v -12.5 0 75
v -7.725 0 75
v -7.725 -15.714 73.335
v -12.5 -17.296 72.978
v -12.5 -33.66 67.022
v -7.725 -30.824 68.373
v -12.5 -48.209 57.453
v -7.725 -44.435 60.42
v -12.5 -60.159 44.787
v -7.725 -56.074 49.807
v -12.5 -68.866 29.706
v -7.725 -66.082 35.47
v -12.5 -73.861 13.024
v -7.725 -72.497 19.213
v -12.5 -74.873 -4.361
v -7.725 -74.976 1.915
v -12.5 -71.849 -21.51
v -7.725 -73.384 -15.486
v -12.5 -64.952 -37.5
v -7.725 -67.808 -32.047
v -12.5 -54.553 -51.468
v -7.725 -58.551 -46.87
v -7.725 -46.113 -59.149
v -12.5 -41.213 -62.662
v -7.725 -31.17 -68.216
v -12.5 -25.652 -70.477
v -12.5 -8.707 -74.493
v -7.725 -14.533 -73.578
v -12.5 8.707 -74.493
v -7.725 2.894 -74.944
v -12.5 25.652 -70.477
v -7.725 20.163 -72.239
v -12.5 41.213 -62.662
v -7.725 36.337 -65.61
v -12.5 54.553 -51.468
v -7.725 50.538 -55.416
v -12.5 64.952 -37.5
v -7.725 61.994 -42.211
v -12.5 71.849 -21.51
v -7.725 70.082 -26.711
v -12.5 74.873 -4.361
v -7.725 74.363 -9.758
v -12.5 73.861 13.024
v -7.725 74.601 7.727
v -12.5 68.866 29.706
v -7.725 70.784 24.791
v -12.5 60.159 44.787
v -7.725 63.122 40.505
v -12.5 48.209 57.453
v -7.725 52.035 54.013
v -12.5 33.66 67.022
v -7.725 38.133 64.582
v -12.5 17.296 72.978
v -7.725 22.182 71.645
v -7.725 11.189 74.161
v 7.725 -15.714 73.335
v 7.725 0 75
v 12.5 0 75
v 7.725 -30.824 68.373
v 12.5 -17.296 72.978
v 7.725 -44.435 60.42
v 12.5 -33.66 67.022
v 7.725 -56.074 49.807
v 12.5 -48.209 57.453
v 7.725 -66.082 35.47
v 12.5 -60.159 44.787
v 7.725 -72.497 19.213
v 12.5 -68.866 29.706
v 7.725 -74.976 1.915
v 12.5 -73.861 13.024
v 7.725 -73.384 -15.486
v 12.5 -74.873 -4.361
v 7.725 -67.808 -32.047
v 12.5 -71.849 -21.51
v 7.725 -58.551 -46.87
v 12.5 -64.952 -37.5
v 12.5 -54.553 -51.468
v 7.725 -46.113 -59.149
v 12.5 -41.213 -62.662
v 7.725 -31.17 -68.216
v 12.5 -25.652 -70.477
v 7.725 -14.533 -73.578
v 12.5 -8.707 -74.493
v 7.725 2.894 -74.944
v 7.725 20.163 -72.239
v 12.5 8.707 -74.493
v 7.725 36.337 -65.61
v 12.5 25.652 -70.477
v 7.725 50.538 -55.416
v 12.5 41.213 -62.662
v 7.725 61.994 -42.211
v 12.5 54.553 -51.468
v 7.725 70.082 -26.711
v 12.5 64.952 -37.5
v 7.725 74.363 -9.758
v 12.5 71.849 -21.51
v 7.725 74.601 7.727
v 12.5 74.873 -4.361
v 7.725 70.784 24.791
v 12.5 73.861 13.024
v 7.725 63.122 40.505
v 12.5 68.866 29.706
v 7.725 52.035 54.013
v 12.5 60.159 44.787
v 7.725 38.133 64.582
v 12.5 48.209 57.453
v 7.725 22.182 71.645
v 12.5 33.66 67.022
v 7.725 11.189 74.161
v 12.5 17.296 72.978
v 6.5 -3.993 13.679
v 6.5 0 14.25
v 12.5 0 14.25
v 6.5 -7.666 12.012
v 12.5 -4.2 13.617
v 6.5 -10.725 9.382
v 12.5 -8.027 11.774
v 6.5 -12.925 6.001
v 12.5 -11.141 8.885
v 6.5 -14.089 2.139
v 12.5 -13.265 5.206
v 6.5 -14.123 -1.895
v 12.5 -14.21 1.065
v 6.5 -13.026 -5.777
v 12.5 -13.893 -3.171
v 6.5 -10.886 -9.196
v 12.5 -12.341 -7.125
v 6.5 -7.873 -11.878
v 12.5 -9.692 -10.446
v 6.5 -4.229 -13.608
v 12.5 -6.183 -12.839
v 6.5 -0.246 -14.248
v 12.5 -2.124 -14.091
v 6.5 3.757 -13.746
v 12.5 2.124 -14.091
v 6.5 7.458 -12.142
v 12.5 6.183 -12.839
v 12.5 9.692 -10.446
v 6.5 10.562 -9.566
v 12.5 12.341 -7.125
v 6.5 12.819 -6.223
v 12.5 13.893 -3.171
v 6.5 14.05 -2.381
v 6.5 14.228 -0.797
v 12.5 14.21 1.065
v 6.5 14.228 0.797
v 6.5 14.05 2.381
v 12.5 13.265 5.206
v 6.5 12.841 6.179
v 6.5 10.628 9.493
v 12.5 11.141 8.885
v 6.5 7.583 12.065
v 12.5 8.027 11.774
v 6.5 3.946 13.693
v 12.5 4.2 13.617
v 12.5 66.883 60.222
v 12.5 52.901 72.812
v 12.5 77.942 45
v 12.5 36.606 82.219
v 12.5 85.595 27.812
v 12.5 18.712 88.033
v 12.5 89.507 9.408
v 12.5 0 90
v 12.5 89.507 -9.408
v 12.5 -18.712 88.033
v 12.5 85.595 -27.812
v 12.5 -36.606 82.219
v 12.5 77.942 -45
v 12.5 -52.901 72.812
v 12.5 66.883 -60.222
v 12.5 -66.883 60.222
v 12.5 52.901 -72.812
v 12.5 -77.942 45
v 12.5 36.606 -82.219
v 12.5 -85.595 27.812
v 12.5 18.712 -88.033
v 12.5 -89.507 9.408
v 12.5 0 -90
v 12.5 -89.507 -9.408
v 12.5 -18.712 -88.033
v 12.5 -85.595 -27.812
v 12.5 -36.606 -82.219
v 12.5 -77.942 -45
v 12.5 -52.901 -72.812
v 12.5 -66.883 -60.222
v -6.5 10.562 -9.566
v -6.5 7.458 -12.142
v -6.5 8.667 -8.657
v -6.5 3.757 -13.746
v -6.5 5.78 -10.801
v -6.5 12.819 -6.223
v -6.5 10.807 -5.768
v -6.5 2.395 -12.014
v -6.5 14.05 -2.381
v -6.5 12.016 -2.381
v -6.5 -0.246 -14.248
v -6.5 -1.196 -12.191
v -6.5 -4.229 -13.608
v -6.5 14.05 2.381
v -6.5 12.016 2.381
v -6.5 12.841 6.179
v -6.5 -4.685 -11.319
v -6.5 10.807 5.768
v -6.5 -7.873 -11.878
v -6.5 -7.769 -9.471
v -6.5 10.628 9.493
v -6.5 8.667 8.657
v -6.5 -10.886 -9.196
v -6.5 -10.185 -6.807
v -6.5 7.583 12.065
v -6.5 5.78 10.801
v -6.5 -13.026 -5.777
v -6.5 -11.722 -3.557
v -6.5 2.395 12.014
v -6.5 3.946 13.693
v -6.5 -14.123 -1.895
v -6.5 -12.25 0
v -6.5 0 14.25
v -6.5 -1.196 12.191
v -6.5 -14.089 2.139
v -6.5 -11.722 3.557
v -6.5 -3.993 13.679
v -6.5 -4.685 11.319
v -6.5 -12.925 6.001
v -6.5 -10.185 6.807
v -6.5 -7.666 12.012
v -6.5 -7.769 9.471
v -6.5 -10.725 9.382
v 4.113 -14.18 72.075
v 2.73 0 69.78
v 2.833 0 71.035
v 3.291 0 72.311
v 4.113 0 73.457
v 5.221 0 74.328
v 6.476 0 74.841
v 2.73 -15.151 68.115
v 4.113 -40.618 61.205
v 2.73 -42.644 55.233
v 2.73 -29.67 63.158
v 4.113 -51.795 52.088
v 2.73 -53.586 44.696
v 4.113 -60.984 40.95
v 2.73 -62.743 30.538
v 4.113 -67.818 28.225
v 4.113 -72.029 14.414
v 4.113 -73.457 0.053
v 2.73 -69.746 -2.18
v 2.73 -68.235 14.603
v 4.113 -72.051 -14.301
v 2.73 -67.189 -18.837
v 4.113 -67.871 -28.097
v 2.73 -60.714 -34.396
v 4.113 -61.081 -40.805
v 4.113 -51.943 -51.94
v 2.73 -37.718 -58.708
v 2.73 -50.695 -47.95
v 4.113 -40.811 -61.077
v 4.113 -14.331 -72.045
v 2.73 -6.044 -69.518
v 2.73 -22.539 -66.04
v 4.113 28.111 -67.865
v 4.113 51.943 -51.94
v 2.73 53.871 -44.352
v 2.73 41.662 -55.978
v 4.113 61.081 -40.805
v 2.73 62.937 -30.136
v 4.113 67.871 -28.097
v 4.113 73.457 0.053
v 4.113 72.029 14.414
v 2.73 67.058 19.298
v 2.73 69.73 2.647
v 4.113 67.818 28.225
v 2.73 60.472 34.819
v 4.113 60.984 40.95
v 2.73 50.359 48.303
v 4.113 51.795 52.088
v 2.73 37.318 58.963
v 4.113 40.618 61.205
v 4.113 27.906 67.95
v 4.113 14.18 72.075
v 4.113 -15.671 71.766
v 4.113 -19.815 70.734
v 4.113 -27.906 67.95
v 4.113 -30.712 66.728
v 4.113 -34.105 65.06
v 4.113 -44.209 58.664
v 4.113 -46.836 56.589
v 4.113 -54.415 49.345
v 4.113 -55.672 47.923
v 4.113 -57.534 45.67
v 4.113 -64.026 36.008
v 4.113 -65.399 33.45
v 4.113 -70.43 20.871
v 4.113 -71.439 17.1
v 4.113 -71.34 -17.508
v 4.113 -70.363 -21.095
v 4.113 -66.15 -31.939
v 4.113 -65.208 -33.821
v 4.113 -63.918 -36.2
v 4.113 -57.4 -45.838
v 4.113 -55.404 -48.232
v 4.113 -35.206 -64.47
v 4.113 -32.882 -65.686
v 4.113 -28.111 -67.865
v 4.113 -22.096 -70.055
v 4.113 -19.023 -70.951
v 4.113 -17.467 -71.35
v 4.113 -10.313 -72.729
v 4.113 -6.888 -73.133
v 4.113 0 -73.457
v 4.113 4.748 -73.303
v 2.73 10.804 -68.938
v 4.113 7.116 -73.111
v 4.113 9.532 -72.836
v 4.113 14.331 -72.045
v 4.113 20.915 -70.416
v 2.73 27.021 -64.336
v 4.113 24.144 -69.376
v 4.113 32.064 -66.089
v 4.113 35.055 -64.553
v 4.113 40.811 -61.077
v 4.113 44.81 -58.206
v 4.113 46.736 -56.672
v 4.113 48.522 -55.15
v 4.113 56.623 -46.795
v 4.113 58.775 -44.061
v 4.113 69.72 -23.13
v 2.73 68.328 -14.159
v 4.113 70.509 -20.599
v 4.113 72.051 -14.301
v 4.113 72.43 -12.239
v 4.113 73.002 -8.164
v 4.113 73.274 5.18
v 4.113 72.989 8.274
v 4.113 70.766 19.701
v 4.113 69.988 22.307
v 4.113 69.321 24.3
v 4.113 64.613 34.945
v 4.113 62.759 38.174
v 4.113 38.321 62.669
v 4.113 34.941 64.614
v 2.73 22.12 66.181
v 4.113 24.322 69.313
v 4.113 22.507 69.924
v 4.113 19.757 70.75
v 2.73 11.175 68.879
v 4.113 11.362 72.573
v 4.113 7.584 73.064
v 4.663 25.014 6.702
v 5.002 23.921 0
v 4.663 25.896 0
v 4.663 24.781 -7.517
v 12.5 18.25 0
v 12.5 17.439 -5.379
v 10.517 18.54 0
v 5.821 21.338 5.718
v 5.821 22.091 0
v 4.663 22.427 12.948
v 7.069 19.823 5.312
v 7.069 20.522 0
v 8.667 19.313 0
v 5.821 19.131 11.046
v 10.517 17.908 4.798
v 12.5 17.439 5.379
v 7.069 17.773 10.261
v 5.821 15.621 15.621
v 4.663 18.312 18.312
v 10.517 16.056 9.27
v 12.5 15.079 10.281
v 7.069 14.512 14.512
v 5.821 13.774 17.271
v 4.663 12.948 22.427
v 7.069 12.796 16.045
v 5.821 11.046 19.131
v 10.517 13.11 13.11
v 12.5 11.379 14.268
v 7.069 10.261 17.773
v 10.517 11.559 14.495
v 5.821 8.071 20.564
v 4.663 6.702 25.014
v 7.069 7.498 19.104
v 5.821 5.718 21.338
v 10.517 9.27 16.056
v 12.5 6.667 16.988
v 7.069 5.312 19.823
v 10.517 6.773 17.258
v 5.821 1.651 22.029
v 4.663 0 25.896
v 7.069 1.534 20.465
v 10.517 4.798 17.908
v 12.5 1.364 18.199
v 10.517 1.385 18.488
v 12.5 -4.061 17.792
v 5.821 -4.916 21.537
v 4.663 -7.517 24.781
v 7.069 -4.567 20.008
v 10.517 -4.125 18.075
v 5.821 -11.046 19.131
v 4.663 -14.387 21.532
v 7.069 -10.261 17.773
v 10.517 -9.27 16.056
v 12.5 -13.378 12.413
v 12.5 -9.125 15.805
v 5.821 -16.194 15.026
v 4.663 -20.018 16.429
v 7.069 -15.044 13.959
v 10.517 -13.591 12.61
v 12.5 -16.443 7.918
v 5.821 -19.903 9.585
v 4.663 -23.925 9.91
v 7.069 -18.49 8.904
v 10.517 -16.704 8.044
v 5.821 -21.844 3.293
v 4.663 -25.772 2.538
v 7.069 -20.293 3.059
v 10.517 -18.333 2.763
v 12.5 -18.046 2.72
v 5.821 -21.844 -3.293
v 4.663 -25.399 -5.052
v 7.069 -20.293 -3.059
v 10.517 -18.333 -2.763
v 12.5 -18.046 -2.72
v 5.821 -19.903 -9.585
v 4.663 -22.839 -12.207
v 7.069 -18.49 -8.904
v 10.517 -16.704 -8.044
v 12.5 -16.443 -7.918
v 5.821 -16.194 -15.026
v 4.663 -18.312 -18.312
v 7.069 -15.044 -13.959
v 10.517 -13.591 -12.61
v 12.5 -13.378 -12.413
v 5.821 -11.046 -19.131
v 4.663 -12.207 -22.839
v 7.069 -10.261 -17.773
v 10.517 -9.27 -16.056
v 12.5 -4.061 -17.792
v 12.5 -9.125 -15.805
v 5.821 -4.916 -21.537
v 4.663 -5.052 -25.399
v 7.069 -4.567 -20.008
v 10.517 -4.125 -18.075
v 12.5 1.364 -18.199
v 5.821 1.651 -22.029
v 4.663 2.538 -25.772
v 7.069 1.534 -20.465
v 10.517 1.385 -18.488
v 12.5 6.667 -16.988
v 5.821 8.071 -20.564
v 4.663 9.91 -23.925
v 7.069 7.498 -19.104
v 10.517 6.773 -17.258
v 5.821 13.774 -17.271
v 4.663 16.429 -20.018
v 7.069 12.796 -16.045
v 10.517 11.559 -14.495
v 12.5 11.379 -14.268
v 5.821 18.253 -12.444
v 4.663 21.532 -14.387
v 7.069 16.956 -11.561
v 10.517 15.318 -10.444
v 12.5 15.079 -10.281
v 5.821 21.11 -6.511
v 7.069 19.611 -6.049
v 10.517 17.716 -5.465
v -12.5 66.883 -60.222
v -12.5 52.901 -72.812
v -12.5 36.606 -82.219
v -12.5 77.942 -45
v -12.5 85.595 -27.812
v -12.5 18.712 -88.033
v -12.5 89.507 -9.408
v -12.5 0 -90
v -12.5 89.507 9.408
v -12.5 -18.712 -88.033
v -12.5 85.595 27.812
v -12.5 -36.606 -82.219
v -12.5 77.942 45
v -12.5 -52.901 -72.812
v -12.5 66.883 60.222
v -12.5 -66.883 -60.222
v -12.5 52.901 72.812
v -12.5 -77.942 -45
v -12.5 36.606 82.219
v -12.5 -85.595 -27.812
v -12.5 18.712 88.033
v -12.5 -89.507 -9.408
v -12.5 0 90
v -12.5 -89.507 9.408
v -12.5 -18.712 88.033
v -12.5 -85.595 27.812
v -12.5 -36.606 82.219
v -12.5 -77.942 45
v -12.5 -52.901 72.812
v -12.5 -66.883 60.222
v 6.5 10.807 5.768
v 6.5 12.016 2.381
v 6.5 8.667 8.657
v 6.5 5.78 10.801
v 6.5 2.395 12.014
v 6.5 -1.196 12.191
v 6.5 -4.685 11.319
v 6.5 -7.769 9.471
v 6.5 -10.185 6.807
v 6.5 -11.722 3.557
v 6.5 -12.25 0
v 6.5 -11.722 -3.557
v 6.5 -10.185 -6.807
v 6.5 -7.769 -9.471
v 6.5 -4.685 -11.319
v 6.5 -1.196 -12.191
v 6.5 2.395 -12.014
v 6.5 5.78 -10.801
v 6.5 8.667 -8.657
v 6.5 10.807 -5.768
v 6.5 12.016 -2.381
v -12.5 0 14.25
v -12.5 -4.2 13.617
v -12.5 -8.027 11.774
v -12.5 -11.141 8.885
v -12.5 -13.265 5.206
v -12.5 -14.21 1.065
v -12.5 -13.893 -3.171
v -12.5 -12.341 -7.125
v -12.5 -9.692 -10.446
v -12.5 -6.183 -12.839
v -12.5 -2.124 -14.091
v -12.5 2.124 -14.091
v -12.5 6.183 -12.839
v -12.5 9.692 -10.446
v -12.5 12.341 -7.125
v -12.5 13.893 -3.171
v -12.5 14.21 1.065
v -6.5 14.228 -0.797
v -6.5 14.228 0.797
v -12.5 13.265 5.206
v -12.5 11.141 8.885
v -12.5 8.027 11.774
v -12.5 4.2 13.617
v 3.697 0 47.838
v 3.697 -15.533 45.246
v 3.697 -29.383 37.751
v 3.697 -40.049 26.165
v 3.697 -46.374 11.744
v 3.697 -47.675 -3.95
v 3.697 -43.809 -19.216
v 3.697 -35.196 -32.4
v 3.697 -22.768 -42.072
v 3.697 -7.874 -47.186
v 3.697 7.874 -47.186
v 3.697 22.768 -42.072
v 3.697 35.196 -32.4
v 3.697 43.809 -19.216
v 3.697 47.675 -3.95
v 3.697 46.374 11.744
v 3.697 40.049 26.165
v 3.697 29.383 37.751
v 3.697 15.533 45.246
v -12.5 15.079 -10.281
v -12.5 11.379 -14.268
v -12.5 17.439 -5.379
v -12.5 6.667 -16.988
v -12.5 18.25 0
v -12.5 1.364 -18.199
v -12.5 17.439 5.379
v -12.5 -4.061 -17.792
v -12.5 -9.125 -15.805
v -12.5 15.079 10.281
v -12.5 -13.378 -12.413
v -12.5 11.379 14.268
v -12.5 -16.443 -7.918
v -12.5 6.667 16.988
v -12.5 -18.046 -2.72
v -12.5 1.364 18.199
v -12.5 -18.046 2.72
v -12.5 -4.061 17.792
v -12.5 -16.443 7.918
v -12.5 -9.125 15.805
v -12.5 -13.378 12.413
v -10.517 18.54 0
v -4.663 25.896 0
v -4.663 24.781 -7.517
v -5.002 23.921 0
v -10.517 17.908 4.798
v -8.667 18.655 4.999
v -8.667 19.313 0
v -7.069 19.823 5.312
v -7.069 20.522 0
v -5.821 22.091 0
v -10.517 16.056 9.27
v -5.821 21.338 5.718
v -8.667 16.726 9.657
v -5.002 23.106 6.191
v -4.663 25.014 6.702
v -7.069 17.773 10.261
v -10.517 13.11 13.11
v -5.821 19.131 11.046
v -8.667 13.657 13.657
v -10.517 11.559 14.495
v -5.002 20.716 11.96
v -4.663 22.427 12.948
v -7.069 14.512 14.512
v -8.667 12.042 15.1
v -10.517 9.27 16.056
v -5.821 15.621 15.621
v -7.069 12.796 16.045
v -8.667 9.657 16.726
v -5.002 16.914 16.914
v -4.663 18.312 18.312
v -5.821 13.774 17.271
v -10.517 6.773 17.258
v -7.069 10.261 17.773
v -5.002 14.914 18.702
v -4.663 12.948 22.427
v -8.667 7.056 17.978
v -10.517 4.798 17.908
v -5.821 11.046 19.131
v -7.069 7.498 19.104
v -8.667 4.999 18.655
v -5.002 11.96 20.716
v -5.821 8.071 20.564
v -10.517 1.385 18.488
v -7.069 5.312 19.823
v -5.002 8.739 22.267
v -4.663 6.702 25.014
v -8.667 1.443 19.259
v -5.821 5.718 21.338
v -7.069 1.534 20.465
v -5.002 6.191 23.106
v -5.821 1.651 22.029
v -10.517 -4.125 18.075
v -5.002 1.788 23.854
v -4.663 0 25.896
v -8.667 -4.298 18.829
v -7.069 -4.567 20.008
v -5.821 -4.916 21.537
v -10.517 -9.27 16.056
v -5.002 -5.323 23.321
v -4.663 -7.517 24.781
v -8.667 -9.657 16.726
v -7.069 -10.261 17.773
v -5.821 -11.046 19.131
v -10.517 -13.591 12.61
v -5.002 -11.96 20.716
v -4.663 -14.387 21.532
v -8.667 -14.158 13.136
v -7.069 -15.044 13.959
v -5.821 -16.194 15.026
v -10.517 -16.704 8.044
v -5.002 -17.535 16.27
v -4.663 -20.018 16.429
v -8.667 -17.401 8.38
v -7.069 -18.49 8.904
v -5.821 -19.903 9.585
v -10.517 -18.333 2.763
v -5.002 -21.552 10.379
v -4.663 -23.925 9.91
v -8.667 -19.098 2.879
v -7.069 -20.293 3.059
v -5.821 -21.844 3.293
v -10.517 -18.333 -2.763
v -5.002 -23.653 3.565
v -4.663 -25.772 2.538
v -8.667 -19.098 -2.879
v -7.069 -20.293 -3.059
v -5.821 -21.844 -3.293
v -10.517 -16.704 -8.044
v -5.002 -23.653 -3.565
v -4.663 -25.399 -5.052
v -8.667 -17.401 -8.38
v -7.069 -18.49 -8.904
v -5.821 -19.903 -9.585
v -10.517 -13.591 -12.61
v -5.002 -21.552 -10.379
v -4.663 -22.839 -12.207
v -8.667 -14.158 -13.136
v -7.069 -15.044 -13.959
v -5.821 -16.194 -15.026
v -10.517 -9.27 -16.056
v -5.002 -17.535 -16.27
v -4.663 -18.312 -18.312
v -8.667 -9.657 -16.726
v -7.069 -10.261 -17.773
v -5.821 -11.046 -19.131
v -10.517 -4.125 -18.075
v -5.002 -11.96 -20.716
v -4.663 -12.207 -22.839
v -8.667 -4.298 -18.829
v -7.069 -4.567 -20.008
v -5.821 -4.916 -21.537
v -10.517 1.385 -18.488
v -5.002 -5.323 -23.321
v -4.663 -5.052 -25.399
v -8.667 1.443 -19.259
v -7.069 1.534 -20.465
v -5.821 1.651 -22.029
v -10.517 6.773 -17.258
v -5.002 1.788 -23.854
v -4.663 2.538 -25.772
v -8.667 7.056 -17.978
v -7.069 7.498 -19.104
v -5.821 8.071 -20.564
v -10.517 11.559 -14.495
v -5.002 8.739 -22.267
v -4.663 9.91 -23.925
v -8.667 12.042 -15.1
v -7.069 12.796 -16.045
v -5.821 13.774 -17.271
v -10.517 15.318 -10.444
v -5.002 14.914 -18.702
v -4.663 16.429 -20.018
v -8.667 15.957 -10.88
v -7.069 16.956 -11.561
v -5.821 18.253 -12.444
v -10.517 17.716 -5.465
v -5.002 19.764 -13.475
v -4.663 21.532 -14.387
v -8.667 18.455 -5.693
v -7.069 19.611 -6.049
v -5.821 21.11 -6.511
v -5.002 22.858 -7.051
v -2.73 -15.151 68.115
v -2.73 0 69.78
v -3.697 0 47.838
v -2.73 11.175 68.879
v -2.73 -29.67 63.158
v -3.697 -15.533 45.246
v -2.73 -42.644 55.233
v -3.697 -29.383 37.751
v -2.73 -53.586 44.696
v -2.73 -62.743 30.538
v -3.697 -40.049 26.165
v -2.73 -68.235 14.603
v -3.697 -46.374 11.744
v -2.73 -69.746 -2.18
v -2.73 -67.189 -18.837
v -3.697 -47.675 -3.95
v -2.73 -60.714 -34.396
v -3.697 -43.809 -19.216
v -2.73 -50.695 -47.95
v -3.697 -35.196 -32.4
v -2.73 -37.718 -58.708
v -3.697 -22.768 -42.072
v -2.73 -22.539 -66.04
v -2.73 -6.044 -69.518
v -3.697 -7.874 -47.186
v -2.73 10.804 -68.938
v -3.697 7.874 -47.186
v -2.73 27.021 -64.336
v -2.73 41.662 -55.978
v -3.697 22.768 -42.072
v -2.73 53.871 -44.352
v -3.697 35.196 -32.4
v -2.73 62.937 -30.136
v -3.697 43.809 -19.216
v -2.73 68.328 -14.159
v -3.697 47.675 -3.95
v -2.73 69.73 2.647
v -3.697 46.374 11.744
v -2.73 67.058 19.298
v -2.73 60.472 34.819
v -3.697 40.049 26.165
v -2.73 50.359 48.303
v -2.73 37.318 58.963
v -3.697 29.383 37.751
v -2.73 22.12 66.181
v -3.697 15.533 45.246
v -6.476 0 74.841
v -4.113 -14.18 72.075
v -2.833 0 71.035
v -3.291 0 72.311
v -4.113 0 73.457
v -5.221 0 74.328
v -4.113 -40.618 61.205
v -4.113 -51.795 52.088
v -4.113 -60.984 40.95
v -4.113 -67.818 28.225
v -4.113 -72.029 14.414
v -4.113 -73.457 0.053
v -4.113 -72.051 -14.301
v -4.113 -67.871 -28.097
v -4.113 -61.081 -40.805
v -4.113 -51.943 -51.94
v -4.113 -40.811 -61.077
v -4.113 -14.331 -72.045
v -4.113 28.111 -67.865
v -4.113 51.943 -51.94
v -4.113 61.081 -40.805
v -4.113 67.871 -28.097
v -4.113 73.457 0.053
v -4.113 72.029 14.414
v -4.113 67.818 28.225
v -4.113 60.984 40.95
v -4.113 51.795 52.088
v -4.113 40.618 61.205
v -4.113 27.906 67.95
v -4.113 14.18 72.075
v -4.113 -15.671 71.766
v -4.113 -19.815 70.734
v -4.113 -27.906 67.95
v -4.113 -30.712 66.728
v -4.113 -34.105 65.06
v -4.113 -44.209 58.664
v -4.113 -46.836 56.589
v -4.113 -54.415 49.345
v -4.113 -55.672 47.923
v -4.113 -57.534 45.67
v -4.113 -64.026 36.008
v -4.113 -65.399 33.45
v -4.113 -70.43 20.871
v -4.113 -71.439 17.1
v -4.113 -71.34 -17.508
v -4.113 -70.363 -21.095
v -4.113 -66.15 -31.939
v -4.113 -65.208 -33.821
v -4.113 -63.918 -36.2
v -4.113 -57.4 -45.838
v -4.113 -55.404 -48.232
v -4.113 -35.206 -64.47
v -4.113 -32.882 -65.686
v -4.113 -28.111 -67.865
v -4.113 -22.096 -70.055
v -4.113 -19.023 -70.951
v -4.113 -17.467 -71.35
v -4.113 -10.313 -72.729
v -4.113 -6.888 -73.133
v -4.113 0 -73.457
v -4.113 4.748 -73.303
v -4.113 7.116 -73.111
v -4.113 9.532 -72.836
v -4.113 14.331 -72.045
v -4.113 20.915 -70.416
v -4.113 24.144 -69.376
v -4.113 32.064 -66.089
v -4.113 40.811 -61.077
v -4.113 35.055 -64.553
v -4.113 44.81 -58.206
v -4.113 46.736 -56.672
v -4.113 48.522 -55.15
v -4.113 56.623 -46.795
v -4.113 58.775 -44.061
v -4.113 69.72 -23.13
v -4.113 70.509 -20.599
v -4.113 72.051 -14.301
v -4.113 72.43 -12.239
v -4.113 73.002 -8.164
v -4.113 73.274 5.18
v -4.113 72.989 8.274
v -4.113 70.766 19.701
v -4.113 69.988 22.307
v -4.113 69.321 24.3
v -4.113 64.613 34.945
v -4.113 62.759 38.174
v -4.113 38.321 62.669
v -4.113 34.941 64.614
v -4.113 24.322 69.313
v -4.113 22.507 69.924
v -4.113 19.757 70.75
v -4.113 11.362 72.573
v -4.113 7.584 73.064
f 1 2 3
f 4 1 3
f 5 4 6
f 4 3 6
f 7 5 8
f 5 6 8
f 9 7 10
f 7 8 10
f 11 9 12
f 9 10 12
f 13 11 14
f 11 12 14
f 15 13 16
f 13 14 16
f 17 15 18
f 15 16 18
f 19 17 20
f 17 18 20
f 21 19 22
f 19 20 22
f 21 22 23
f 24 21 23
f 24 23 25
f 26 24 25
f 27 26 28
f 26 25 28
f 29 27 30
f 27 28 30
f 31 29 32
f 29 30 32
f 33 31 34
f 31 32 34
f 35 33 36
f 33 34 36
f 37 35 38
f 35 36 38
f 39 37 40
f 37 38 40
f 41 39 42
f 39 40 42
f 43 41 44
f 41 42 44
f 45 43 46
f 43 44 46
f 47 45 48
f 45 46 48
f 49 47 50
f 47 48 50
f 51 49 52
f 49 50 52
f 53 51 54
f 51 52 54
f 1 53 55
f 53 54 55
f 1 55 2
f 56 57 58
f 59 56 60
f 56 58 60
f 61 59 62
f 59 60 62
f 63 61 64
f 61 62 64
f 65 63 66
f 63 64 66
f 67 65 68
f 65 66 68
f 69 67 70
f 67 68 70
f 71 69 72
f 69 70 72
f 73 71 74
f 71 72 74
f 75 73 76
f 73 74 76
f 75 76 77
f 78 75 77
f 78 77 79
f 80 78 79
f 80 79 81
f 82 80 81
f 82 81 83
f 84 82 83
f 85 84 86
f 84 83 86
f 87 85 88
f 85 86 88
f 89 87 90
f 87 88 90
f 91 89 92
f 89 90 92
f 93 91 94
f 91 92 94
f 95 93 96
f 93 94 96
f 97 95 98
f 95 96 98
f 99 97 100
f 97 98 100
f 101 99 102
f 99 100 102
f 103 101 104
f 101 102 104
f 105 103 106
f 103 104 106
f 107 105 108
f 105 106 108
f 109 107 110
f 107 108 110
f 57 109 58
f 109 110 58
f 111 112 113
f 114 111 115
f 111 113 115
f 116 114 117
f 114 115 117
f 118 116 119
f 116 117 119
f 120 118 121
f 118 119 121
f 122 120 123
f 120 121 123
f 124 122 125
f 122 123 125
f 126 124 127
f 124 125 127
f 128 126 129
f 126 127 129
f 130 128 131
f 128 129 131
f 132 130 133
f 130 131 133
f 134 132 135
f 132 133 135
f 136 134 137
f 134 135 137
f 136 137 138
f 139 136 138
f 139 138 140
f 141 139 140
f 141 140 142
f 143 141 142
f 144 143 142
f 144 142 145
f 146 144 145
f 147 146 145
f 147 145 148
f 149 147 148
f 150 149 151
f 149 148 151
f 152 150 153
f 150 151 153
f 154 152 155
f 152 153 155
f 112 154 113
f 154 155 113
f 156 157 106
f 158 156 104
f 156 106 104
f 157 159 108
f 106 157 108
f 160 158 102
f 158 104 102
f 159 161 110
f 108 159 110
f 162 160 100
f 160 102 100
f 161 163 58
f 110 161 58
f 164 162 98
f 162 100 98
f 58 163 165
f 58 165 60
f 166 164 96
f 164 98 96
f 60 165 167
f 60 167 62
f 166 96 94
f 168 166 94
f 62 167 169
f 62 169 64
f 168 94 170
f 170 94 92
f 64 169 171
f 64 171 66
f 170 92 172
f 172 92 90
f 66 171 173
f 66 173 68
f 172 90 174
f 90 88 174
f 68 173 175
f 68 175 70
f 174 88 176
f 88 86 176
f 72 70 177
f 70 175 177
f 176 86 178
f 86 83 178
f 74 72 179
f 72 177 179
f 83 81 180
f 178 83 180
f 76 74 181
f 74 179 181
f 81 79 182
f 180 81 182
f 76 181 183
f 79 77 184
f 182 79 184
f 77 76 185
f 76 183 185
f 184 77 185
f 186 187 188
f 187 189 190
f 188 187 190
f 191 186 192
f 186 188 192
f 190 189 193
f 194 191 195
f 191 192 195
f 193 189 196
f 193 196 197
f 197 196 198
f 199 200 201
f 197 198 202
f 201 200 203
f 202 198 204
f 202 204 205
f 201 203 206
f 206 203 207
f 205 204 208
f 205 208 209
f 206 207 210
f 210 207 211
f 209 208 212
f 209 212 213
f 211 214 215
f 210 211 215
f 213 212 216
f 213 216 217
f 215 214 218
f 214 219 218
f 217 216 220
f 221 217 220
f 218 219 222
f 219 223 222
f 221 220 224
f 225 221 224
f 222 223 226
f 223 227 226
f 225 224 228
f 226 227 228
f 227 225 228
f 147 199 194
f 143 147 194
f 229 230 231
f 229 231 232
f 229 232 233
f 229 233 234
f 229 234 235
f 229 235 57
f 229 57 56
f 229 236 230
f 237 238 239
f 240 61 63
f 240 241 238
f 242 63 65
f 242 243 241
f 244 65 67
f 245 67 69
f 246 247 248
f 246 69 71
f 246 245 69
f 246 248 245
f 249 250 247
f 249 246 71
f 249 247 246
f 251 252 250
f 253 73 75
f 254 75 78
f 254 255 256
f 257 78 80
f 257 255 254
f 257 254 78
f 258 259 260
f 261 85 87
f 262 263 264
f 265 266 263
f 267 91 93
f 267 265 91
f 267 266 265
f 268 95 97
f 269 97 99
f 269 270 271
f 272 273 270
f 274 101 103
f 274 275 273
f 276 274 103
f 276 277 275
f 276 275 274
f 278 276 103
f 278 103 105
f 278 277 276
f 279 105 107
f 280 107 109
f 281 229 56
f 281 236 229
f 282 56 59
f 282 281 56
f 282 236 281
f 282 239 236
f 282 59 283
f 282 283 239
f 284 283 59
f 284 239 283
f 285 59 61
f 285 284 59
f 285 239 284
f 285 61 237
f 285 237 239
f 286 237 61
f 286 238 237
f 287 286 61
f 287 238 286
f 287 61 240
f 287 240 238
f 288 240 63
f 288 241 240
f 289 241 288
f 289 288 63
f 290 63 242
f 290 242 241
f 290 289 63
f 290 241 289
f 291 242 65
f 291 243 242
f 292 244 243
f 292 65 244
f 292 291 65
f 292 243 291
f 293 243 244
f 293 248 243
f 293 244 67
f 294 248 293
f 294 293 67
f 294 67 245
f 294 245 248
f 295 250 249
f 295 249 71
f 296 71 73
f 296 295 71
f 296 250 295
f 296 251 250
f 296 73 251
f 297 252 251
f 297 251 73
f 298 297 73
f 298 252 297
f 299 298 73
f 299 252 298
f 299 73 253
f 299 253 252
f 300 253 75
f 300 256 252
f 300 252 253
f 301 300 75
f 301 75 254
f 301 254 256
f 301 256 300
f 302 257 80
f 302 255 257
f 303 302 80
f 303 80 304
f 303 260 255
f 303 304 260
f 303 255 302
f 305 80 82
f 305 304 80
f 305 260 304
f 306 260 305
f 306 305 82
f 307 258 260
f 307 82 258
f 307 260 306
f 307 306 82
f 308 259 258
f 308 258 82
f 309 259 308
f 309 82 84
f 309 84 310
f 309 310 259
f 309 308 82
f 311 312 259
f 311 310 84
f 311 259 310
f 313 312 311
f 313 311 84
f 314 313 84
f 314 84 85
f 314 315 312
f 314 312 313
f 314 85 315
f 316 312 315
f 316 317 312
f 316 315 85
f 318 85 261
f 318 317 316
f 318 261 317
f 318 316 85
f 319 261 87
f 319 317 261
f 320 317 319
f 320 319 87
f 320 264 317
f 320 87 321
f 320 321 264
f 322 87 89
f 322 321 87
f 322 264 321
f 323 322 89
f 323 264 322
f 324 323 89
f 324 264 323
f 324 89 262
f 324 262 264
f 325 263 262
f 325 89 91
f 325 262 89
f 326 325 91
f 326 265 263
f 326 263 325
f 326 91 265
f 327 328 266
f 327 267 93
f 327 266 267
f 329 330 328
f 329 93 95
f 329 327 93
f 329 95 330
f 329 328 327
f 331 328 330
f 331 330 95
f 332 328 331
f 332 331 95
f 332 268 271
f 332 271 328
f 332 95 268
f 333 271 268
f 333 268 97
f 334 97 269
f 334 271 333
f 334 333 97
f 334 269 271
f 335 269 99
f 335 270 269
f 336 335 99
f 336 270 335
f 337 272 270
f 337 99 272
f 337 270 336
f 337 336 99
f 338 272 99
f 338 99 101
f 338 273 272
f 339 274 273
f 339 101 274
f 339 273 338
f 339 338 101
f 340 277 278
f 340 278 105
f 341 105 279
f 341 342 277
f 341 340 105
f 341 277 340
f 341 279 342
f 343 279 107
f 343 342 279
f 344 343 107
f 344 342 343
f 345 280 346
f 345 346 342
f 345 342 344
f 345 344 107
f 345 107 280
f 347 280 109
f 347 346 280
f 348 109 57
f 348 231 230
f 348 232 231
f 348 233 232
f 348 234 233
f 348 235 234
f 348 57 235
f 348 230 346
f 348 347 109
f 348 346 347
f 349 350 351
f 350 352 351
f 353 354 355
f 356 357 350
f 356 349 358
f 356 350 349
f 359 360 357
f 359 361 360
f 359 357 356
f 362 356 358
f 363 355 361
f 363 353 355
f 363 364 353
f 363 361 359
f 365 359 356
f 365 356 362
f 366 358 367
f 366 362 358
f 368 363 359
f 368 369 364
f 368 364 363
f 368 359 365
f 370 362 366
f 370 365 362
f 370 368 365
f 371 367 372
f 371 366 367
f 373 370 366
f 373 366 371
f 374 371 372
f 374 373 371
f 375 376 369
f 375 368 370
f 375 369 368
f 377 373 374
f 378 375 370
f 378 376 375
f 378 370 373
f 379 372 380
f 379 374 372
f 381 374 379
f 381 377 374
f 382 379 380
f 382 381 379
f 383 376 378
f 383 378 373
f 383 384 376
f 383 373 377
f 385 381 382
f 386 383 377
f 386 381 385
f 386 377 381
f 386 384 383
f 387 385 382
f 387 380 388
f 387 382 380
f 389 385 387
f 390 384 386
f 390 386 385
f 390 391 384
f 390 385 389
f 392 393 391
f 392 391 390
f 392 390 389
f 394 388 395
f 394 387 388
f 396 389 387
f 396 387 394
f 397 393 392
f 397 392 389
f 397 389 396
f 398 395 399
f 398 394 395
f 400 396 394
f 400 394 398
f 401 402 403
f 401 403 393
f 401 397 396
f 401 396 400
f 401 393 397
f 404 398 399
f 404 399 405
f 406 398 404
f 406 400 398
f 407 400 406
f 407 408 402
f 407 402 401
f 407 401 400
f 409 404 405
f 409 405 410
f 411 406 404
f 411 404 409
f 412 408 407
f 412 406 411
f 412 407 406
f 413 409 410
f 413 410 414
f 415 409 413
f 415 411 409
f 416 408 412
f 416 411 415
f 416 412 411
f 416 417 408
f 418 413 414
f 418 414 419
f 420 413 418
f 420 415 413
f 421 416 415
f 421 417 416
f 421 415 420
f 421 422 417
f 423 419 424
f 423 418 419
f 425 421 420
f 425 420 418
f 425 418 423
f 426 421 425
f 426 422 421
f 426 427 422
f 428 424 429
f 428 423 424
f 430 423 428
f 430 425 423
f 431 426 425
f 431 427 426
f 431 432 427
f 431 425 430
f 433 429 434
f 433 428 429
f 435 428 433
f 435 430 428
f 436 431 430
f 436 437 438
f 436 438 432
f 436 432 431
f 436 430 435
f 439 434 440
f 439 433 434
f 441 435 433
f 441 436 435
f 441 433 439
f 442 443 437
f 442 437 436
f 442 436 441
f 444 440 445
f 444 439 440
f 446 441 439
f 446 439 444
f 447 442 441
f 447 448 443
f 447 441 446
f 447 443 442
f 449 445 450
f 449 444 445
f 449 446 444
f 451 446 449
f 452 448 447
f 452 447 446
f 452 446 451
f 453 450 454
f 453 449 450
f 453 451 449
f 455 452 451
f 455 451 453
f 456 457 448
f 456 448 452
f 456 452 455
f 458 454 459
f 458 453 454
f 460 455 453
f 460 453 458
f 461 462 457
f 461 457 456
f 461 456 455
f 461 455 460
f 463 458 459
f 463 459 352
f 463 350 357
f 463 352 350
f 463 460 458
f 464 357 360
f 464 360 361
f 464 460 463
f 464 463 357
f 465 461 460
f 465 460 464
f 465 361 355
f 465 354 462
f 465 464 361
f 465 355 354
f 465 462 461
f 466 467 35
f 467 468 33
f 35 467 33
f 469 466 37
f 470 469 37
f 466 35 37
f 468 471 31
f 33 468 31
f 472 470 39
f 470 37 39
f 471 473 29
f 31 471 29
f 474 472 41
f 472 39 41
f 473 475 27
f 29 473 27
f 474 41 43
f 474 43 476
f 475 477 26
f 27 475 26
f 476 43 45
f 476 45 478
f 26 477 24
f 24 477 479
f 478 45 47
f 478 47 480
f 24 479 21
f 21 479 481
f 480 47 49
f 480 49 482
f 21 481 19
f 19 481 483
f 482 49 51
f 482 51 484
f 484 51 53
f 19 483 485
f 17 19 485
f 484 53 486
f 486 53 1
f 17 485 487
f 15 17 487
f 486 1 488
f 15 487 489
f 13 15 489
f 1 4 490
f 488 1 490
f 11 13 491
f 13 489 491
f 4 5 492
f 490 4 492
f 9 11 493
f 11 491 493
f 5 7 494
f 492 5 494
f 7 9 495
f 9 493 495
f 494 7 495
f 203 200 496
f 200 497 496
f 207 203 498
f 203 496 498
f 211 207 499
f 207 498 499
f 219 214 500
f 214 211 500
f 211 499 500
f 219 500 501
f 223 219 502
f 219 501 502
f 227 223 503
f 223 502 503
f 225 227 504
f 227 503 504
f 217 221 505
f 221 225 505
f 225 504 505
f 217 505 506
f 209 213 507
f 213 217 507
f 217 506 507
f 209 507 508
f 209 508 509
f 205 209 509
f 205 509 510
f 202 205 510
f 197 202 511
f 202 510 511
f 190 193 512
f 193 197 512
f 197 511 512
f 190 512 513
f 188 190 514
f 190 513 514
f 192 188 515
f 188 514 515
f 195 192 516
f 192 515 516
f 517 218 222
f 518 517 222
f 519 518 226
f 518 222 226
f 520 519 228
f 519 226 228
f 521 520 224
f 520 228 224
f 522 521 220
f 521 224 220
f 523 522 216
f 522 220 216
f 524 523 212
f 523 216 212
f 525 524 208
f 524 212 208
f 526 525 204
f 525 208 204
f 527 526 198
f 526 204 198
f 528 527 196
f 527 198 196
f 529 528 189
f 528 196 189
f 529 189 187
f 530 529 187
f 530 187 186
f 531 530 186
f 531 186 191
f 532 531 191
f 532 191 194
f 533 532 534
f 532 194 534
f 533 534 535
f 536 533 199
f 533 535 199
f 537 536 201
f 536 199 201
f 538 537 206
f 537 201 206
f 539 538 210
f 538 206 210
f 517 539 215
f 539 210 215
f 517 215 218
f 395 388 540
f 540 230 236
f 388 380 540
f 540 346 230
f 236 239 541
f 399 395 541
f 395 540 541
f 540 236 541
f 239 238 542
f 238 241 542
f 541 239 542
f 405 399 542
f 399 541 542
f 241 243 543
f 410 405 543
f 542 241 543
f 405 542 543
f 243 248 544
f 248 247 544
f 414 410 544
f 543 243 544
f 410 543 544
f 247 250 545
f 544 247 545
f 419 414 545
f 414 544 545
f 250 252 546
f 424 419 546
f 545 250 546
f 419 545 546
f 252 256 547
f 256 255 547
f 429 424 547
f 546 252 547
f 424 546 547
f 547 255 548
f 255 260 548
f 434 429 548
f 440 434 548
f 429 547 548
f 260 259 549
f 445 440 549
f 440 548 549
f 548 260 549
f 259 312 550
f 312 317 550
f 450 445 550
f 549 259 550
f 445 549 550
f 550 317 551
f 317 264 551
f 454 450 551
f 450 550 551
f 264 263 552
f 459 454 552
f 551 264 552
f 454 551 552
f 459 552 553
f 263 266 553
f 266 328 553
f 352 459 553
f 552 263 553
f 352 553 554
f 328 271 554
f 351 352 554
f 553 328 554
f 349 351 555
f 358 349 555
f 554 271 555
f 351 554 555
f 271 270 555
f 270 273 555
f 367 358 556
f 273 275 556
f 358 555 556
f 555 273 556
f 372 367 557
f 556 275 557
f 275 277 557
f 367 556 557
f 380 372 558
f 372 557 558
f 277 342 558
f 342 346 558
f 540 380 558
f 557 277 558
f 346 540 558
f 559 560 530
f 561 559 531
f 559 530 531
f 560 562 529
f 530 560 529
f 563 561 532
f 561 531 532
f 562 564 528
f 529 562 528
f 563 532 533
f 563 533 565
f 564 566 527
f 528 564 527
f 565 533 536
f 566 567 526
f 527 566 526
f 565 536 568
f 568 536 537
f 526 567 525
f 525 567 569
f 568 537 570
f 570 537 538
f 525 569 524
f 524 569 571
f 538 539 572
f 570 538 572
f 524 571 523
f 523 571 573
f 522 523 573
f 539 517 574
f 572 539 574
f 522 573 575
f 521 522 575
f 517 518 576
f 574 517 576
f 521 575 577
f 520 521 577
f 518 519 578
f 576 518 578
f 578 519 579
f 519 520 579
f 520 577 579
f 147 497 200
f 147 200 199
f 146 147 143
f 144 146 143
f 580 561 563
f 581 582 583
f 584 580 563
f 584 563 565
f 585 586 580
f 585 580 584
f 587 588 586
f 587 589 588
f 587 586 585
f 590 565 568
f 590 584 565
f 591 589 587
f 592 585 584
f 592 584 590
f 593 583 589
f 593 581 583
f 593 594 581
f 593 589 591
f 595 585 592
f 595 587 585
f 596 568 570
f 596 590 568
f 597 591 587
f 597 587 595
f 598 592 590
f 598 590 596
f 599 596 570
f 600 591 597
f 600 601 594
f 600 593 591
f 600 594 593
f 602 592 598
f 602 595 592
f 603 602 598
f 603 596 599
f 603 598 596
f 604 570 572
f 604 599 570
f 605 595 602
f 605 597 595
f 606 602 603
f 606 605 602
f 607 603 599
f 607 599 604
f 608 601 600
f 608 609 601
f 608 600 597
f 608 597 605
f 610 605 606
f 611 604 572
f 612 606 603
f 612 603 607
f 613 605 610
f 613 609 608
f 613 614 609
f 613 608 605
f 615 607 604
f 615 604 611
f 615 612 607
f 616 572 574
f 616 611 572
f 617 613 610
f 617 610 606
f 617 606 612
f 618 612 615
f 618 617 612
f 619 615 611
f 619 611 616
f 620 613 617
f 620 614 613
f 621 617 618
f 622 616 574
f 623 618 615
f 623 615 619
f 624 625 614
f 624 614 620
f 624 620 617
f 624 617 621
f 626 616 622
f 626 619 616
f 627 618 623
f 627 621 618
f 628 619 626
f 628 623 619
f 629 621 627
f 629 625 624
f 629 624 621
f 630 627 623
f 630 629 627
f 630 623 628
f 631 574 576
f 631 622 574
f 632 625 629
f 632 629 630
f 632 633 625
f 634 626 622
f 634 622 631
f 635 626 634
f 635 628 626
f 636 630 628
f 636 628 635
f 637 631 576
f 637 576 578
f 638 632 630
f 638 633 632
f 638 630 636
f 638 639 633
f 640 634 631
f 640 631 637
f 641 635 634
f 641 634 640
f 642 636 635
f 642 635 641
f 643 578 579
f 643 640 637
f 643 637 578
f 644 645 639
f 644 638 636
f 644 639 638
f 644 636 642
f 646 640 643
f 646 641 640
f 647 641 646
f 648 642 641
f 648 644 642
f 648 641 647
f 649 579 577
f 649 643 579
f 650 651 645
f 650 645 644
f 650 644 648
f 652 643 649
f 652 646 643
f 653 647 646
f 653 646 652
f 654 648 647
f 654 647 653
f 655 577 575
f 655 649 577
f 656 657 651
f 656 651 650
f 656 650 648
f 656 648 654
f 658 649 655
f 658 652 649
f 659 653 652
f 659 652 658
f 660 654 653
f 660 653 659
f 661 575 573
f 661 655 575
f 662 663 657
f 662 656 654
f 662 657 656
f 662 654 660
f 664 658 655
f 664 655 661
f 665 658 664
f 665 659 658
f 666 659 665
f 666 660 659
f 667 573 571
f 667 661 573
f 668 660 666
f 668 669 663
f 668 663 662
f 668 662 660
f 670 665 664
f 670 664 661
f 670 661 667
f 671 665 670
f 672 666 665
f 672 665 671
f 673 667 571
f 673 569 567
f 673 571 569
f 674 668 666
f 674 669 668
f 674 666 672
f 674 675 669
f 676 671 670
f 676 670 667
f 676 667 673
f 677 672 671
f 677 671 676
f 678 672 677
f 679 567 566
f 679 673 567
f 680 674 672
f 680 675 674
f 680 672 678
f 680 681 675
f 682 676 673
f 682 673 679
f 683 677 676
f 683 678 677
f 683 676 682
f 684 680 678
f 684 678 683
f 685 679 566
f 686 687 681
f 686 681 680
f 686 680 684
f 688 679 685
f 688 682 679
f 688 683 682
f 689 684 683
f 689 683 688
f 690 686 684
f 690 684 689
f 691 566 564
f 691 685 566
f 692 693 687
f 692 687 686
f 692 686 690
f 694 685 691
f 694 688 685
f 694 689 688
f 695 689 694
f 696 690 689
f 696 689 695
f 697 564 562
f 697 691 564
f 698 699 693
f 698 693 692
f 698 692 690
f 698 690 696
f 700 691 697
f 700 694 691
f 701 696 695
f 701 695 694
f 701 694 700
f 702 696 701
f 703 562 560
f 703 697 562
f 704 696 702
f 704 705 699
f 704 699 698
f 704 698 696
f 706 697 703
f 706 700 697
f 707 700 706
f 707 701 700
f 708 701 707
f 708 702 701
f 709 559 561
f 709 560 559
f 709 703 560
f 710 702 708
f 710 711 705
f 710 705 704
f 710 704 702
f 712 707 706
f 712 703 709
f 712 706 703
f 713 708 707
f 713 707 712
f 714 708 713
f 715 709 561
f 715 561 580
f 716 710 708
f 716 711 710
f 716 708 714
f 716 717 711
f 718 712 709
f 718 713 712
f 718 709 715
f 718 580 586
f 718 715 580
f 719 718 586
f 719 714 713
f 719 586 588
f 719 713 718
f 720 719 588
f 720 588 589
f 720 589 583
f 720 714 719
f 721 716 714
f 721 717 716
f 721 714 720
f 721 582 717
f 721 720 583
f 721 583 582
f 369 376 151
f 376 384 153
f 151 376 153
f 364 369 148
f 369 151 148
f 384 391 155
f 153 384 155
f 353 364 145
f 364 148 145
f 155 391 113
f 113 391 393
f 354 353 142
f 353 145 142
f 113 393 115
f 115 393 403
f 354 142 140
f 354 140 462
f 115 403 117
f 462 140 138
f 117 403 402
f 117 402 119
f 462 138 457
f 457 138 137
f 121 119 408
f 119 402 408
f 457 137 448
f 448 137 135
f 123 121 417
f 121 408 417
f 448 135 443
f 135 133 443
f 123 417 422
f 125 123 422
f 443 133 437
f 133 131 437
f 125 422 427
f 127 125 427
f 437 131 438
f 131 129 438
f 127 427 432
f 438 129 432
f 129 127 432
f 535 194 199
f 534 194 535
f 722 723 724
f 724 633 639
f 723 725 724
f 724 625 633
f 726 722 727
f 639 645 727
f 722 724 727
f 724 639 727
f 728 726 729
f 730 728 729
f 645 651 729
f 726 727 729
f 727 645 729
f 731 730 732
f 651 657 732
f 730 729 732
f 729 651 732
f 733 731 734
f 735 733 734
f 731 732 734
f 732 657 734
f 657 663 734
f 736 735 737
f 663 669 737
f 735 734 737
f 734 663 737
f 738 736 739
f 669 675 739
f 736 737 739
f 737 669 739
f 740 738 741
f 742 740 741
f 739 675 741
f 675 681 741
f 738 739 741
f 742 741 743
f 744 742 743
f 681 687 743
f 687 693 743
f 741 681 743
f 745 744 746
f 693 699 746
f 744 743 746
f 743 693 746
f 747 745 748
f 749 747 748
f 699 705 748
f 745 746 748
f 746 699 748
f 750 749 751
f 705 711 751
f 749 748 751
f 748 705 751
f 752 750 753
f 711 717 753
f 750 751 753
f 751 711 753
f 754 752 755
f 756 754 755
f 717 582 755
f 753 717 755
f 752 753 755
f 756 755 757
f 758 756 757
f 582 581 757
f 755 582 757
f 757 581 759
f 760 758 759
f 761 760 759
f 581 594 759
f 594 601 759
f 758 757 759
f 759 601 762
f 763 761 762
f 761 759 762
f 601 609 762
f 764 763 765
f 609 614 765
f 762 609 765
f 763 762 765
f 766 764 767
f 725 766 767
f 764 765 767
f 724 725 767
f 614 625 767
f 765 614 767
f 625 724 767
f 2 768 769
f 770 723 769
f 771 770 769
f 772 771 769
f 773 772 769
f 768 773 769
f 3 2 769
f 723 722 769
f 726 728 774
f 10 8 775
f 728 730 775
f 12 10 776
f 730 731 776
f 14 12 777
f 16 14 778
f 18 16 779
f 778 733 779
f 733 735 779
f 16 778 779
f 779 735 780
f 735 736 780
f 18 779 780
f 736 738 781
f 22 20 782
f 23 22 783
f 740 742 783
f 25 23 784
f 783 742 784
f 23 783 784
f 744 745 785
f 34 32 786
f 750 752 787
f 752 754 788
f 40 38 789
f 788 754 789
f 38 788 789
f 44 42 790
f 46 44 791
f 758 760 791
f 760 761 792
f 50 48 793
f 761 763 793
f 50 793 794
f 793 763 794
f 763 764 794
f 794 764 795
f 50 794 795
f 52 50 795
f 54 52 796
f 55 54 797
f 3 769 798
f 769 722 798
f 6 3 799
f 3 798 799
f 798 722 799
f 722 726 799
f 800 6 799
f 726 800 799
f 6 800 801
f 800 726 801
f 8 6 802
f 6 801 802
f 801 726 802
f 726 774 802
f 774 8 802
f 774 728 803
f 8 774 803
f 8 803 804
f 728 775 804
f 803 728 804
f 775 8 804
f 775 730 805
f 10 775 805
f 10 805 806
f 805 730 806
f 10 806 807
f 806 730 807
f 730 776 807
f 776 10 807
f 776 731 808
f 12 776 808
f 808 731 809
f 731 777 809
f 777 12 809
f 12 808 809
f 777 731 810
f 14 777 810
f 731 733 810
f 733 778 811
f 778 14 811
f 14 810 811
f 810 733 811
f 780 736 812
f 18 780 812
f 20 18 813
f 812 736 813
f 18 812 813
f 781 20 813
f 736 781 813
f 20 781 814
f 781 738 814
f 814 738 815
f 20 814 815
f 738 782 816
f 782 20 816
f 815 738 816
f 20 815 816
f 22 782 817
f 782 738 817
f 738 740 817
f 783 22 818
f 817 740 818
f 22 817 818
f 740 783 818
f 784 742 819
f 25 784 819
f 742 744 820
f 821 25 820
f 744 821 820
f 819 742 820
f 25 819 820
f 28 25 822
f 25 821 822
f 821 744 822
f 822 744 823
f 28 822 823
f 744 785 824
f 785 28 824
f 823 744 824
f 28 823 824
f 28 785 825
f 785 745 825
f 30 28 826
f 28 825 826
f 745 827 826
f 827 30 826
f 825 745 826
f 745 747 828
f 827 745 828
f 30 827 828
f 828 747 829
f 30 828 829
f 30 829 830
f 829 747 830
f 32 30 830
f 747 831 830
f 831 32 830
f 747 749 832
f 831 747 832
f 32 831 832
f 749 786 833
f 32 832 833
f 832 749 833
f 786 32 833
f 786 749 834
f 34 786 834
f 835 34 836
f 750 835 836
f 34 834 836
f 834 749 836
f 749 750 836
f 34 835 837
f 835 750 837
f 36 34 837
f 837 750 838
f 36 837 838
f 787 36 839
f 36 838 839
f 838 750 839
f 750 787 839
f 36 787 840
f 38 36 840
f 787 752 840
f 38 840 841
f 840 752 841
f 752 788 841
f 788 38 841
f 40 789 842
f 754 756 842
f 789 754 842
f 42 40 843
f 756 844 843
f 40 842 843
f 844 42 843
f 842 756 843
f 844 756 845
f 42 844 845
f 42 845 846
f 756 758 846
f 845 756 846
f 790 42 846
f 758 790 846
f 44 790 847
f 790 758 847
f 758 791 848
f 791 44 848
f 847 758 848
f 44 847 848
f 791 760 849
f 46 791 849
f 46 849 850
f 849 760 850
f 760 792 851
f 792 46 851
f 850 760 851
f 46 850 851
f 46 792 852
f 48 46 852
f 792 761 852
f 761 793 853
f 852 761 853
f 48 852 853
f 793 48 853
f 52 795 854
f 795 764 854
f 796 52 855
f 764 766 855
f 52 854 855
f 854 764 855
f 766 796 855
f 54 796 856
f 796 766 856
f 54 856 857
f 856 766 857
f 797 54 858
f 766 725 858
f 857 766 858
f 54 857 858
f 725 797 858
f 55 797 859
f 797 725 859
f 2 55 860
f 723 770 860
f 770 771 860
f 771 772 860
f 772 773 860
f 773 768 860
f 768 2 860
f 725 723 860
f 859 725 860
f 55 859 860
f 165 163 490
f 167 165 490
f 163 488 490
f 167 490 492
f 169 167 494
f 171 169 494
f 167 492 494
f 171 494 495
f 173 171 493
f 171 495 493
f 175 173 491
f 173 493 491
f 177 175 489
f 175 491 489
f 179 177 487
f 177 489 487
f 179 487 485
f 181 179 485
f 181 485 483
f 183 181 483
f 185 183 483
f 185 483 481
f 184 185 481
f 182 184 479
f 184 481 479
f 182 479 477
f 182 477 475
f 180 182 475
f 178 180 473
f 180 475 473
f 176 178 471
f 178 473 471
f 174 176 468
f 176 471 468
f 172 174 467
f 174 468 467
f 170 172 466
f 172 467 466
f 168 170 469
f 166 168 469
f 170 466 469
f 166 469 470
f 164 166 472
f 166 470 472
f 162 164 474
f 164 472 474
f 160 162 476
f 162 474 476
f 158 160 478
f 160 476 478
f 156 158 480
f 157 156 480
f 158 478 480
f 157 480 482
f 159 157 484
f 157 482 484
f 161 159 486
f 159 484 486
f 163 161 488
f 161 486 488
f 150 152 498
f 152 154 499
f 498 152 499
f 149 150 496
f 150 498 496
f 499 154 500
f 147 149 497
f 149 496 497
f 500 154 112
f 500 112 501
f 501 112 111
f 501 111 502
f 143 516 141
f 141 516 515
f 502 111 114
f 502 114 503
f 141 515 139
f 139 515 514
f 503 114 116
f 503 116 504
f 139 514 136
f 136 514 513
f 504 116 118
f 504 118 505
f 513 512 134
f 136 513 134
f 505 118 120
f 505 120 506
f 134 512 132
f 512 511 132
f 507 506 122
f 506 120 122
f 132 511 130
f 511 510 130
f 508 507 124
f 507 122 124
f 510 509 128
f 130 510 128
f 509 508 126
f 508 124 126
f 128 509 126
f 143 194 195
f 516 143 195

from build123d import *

# Parameters (mm, degrees)
FILLET1_R                      = 5
CUT_EXTRUDE1_REACH             = 129.892
CUT_EXTRUDE1_DIRECTION_2_REACH = 129.892


with BuildPart() as part:
    # Sketch1 → Revolve1 (revolve)
    with BuildSketch(Plane.XY, mode=Mode.PRIVATE) as revolve1_sk:
        Polygon((-2.5, 74.999999959), (-5, 18.25), (-12.5, 18.25), (-12.5, 14.25), (-6.5, 14.25), (-6.5, 12.25), (6.5, 12.25), (6.5, 14.25), (12.5, 14.25), (12.5, 18.25), (5, 18.25), (2.5, 74.999999959), (12.5, 74.999999959), (12.5, 89.999999959), (-12.5, 89.999999959), (-12.5, 74.999999959), align=None)
    revolve(revolve1_sk.sketch.rotate(Axis((-13.75, 0, 0), (1, 0, 0)), 90), axis=Axis((-13.75, 0, 0), (1, 0, 0)))

    # Fillet1
    fillet1_edges = [part.edges().sort_by_distance(p)[0] for p in [
        (-2.5, 0, -74.999999959),
        (2.5, 0, -74.999999959),
    ]]
    fillet(fillet1_edges, radius=FILLET1_R)

    # Fillet2: read off the stored shape, not the designer's step
    # Fillet2 outline → Fillet2 (revolve)
    with BuildSketch(Plane.YX):
        with BuildLine():
            Line((18.25, 12.5), (18.25, 4.663153786))
            Line((18.25, 4.663153786), (25.896409048, 4.663153786))
            ThreePointArc((25.896409048, 4.663153786), (20.522492538, 7.068547565), (18.25, 12.5))
        make_face()
        with BuildLine():
            Line((25.896409048, -4.663153786), (18.25, -4.663153786))
            Line((18.25, -4.663153786), (18.25, -12.5))
            ThreePointArc((18.25, -12.5), (20.522492538, -7.068547565), (25.896409048, -4.663153786))
        make_face()
    revolve(axis=Axis((0, 0, 0), (1, 0, 0)))

    # Sketch4 → Cut-Extrude1 (cut, up to next)
    with BuildSketch(Plane(origin=(0, 0, 0), x_dir=(0, 0, -1), z_dir=(1, 0, 0)), mode=Mode.PRIVATE) as cut_extrude1_sk1:
        with BuildLine():
            Line((-2.38125, 12.016328409), (-2.38125, 14.049631612))
            Line((-2.38125, 14.049631612), (2.38125, 14.049631612))
            Line((2.38125, 14.049631612), (2.38125, 12.016328409))
            ThreePointArc((2.38125, 12.016328409), (0, 12.25), (-2.38125, 12.016328409))
        make_face()
    cut_extrude1_tool1 = extrude(cut_extrude1_sk1.sketch, amount=-CUT_EXTRUDE1_REACH, mode=Mode.PRIVATE) & part.part
    add(cut_extrude1_tool1.solids().sort_by_distance((0, 13.109731, 0))[0], mode=Mode.SUBTRACT)

    # Sketch4 → Cut-Extrude1 direction 2 (cut, up to next)
    with BuildSketch(Plane(origin=(0, 0, 0), x_dir=(0, 0, -1), z_dir=(1, 0, 0)), mode=Mode.PRIVATE) as cut_extrude1_direction_2_sk1:
        with BuildLine():
            Line((-2.38125, 12.016328409), (-2.38125, 14.049631612))
            Line((-2.38125, 14.049631612), (2.38125, 14.049631612))
            Line((2.38125, 14.049631612), (2.38125, 12.016328409))
            ThreePointArc((2.38125, 12.016328409), (0, 12.25), (-2.38125, 12.016328409))
        make_face()
    cut_extrude1_direction_2_tool1 = extrude(cut_extrude1_direction_2_sk1.sketch, amount=CUT_EXTRUDE1_DIRECTION_2_REACH, mode=Mode.PRIVATE) & part.part
    add(cut_extrude1_direction_2_tool1.solids().sort_by_distance((0, 13.109731, 0))[0], mode=Mode.SUBTRACT)


solid = part.part
